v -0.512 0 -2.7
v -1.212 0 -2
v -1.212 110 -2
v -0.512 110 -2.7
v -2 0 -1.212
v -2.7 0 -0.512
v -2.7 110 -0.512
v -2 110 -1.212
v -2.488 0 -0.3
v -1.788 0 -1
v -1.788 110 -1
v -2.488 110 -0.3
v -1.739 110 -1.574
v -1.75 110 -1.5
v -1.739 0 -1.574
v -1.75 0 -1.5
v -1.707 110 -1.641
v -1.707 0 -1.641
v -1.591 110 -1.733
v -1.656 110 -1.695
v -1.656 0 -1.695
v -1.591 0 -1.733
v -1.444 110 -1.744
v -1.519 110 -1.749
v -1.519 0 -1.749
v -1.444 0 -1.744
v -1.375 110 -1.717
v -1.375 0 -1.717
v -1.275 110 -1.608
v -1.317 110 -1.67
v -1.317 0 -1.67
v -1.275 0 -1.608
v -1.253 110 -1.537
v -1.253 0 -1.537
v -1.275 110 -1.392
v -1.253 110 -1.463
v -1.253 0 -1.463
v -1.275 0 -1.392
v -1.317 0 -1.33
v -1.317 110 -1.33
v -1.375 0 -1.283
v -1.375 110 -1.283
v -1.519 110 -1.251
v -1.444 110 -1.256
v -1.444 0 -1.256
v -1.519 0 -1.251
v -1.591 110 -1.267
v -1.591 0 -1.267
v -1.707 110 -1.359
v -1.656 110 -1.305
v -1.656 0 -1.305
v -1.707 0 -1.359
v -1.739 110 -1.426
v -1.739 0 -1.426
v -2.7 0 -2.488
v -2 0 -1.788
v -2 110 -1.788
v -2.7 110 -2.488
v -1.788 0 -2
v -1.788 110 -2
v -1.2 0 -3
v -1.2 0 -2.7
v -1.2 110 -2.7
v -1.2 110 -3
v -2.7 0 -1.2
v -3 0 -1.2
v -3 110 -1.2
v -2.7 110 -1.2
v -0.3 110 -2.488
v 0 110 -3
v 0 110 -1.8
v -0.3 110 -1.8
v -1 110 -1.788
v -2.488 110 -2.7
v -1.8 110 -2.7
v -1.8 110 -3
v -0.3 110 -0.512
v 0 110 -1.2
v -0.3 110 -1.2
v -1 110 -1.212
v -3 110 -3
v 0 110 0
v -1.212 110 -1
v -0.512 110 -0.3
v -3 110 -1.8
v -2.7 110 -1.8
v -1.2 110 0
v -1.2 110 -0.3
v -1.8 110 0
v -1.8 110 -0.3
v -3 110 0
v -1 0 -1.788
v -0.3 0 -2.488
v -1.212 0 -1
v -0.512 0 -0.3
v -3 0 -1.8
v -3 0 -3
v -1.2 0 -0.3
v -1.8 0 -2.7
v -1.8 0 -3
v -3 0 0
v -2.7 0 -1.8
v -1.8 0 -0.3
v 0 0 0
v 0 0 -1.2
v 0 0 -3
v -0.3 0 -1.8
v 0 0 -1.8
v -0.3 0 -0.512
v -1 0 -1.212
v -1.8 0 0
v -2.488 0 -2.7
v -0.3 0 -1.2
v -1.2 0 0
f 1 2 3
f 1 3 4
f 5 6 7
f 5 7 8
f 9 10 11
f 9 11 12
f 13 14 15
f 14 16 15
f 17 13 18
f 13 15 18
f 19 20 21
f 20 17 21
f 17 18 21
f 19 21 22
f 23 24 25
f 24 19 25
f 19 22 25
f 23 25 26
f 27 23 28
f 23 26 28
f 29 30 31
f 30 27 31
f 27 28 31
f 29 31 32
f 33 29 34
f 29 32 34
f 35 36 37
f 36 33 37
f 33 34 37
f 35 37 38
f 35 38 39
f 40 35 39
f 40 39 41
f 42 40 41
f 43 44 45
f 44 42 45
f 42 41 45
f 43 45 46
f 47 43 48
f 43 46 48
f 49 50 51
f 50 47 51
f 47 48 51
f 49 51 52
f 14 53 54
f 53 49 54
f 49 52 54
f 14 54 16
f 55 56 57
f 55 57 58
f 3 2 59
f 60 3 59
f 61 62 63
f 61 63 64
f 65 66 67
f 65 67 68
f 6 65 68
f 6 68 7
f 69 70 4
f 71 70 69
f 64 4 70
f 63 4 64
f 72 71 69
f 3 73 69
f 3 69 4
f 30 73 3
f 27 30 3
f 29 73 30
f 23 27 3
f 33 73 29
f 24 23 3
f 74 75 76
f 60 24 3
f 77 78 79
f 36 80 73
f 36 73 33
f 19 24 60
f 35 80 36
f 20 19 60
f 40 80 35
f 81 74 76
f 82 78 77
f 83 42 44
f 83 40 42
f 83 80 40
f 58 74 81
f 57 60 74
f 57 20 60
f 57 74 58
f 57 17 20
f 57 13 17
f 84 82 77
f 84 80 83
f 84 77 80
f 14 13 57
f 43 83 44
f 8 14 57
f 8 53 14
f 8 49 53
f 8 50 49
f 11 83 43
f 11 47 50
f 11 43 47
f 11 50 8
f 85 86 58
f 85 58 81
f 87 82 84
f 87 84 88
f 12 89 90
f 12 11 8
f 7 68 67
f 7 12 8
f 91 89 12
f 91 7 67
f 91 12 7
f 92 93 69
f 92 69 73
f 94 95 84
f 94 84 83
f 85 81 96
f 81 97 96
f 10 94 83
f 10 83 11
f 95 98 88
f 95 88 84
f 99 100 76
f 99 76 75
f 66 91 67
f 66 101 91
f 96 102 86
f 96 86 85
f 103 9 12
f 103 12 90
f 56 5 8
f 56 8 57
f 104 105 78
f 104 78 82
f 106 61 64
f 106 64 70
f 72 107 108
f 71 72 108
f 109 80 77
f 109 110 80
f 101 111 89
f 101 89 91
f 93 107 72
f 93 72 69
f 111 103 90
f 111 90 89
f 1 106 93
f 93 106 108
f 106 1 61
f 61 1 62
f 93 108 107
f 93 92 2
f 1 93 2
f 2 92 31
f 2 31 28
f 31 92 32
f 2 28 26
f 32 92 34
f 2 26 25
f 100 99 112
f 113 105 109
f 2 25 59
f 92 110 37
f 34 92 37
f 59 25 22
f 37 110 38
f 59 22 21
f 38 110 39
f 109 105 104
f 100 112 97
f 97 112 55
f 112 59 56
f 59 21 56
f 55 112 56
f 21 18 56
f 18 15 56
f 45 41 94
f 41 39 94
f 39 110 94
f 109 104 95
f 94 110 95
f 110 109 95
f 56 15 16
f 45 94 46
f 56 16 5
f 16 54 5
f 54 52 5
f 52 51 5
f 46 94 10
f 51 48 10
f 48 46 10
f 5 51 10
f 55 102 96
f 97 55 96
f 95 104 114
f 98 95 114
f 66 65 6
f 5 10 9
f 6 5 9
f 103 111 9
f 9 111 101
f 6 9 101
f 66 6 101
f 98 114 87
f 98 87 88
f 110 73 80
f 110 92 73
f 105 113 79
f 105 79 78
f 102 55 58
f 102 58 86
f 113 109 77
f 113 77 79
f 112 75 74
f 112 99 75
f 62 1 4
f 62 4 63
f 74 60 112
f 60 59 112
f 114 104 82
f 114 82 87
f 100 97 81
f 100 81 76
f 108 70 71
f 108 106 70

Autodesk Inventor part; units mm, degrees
ref_plane "YZ Plane" through (0, 0, 0) normal (1, 0, 0) x (0, 1, 0)
ref_plane "XZ Plane" through (0, 0, 0) normal (0, 1, 0) x (-1, 0, 0)
ref_plane "XY Plane" through (0, 0, 0) normal (0, 0, 1) x (1, 0, 0)
sketch "Skizze1" plane through (0, 0, 0) normal (0, 1, 0) x (-1, 0, 0)
  line L0 (0, 0) -> (3, 0) construction
  line L1 (3, 0) -> (3, -3) construction
  line L2 (3, -3) -> (0, -3) construction
  line L3 (0, -3) -> (0, 0) construction
  line L4 (3, -1.5) -> (0, -1.5) construction
  line L5 (1.5, -3) -> (1.5, 0) construction
  circle A0 centre (1.5, -1.5) radius 0.25
  line L6 (2, -1) -> (1, -1) construction
  line L7 (1, -1) -> (1, -2) construction
  line L8 (1, -2) -> (2, -2) construction
  line L9 (2, -2) -> (2, -1) construction
  line L10 (1.5, -1) -> (1.5, -2) construction
  line L11 (2, -1.5) -> (1, -1.5) construction
  line L12 (3, -1.2) -> (0, -1.2) construction
  line L13 (1.2, 0) -> (1.2, -3) construction
  line L14 (0, -1.8) -> (3, -1.8) construction
  line L15 (1.8, 0) -> (1.8, -3) construction
  line L16 (2.7, -2.7) -> (2.7, -0.3) construction
  line L17 (2.7, -0.3) -> (0.3, -0.3) construction
  line L18 (0.3, -0.3) -> (0.3, -2.7) construction
  line L19 (0.3, -2.7) -> (2.7, -2.7) construction
  line L20 (2.7, -0.3) -> (0.3, -2.7) construction
  line L21 (2.7, -2.7) -> (0.3, -0.3) construction
  line L22 (2.7, -0.5121) -> (0.5121, -2.7) construction
  line L23 (0.3, -2.4879) -> (2.4879, -0.3) construction
  line L24 (0.5121, -0.3) -> (2.7, -2.4879) construction
  line L25 (2.4879, -2.7) -> (0.3, -0.5121) construction
  line L26 (3, 0) -> (3, -1.2)
  line L27 (3, -1.2) -> (2.7, -1.2)
  line L28 (2.7, -1.2) -> (2.7, -0.5121)
  line L29 (2.7, -0.5121) -> (2, -1.2121)
  line L30 (2, -1.2121) -> (2, -1.7879)
  line L31 (2, -1.7879) -> (2.7, -2.4879)
  line L32 (2.7, -2.4879) -> (2.7, -1.8)
  line L33 (2.7, -1.8) -> (3, -1.8)
  line L34 (3, -3) -> (3, -1.8)
  line L35 (3, -3) -> (1.8, -3)
  line L36 (1.8, -3) -> (1.8, -2.7)
  line L37 (1.8, -2.7) -> (2.4879, -2.7)
  line L38 (1.7879, -2) -> (2.4879, -2.7)
  line L39 (1.2121, -2) -> (1.7879, -2)
  line L40 (1.2121, -2) -> (0.5121, -2.7)
  line L41 (0.5121, -2.7) -> (1.2, -2.7)
  line L42 (1.2, -2.7) -> (1.2, -3)
  line L43 (1.2, -3) -> (0, -3)
  line L44 (0, -3) -> (0, -1.8)
  line L45 (0.3, -1.8) -> (0, -1.8)
  line L46 (0.3, -1.8) -> (0.3, -2.4879)
  line L47 (0.3, -2.4879) -> (1, -1.7879)
  line L48 (1, -1.7879) -> (1, -1.2121)
  line L49 (1, -1.2121) -> (0.3, -0.5121)
  line L50 (0.3, -0.5121) -> (0.3, -1.2)
  line L51 (0.3, -1.2) -> (0, -1.2)
  line L52 (0, -1.2) -> (0, 0)
  line L53 (0, 0) -> (1.2, 0)
  line L54 (1.2, 0) -> (1.2, -0.3)
  line L55 (1.2, -0.3) -> (0.5121, -0.3)
  line L56 (0.5121, -0.3) -> (1.2121, -1)
  line L57 (1.2121, -1) -> (1.7879, -1)
  line L58 (1.7879, -1) -> (2.4879, -0.3)
  line L59 (2.4879, -0.3) -> (1.8, -0.3)
  line L60 (1.8, -0.3) -> (1.8, 0)
  line L61 (1.8, 0) -> (3, 0)
  dimension "d0" = 3
  dimension "d1" = 3
  dimension "d2" = 0.5
  dimension "d3" = 1
  dimension "d4" = 1
  dimension "d5" = 1.2
  dimension "d6" = 1.2
  dimension "d7" = 1.2
  dimension "d8" = 1.2
  dimension "d9" = 0.3
  dimension "d10" = 0.15
  dimension "d11" = 0.15
  dimension "d12" = 0.15
  dimension "d13" = 0.15
extrude "Extrusion1" add sketch "Skizze1" along normal blind 110
properties part number "item_30x30_110cm"
